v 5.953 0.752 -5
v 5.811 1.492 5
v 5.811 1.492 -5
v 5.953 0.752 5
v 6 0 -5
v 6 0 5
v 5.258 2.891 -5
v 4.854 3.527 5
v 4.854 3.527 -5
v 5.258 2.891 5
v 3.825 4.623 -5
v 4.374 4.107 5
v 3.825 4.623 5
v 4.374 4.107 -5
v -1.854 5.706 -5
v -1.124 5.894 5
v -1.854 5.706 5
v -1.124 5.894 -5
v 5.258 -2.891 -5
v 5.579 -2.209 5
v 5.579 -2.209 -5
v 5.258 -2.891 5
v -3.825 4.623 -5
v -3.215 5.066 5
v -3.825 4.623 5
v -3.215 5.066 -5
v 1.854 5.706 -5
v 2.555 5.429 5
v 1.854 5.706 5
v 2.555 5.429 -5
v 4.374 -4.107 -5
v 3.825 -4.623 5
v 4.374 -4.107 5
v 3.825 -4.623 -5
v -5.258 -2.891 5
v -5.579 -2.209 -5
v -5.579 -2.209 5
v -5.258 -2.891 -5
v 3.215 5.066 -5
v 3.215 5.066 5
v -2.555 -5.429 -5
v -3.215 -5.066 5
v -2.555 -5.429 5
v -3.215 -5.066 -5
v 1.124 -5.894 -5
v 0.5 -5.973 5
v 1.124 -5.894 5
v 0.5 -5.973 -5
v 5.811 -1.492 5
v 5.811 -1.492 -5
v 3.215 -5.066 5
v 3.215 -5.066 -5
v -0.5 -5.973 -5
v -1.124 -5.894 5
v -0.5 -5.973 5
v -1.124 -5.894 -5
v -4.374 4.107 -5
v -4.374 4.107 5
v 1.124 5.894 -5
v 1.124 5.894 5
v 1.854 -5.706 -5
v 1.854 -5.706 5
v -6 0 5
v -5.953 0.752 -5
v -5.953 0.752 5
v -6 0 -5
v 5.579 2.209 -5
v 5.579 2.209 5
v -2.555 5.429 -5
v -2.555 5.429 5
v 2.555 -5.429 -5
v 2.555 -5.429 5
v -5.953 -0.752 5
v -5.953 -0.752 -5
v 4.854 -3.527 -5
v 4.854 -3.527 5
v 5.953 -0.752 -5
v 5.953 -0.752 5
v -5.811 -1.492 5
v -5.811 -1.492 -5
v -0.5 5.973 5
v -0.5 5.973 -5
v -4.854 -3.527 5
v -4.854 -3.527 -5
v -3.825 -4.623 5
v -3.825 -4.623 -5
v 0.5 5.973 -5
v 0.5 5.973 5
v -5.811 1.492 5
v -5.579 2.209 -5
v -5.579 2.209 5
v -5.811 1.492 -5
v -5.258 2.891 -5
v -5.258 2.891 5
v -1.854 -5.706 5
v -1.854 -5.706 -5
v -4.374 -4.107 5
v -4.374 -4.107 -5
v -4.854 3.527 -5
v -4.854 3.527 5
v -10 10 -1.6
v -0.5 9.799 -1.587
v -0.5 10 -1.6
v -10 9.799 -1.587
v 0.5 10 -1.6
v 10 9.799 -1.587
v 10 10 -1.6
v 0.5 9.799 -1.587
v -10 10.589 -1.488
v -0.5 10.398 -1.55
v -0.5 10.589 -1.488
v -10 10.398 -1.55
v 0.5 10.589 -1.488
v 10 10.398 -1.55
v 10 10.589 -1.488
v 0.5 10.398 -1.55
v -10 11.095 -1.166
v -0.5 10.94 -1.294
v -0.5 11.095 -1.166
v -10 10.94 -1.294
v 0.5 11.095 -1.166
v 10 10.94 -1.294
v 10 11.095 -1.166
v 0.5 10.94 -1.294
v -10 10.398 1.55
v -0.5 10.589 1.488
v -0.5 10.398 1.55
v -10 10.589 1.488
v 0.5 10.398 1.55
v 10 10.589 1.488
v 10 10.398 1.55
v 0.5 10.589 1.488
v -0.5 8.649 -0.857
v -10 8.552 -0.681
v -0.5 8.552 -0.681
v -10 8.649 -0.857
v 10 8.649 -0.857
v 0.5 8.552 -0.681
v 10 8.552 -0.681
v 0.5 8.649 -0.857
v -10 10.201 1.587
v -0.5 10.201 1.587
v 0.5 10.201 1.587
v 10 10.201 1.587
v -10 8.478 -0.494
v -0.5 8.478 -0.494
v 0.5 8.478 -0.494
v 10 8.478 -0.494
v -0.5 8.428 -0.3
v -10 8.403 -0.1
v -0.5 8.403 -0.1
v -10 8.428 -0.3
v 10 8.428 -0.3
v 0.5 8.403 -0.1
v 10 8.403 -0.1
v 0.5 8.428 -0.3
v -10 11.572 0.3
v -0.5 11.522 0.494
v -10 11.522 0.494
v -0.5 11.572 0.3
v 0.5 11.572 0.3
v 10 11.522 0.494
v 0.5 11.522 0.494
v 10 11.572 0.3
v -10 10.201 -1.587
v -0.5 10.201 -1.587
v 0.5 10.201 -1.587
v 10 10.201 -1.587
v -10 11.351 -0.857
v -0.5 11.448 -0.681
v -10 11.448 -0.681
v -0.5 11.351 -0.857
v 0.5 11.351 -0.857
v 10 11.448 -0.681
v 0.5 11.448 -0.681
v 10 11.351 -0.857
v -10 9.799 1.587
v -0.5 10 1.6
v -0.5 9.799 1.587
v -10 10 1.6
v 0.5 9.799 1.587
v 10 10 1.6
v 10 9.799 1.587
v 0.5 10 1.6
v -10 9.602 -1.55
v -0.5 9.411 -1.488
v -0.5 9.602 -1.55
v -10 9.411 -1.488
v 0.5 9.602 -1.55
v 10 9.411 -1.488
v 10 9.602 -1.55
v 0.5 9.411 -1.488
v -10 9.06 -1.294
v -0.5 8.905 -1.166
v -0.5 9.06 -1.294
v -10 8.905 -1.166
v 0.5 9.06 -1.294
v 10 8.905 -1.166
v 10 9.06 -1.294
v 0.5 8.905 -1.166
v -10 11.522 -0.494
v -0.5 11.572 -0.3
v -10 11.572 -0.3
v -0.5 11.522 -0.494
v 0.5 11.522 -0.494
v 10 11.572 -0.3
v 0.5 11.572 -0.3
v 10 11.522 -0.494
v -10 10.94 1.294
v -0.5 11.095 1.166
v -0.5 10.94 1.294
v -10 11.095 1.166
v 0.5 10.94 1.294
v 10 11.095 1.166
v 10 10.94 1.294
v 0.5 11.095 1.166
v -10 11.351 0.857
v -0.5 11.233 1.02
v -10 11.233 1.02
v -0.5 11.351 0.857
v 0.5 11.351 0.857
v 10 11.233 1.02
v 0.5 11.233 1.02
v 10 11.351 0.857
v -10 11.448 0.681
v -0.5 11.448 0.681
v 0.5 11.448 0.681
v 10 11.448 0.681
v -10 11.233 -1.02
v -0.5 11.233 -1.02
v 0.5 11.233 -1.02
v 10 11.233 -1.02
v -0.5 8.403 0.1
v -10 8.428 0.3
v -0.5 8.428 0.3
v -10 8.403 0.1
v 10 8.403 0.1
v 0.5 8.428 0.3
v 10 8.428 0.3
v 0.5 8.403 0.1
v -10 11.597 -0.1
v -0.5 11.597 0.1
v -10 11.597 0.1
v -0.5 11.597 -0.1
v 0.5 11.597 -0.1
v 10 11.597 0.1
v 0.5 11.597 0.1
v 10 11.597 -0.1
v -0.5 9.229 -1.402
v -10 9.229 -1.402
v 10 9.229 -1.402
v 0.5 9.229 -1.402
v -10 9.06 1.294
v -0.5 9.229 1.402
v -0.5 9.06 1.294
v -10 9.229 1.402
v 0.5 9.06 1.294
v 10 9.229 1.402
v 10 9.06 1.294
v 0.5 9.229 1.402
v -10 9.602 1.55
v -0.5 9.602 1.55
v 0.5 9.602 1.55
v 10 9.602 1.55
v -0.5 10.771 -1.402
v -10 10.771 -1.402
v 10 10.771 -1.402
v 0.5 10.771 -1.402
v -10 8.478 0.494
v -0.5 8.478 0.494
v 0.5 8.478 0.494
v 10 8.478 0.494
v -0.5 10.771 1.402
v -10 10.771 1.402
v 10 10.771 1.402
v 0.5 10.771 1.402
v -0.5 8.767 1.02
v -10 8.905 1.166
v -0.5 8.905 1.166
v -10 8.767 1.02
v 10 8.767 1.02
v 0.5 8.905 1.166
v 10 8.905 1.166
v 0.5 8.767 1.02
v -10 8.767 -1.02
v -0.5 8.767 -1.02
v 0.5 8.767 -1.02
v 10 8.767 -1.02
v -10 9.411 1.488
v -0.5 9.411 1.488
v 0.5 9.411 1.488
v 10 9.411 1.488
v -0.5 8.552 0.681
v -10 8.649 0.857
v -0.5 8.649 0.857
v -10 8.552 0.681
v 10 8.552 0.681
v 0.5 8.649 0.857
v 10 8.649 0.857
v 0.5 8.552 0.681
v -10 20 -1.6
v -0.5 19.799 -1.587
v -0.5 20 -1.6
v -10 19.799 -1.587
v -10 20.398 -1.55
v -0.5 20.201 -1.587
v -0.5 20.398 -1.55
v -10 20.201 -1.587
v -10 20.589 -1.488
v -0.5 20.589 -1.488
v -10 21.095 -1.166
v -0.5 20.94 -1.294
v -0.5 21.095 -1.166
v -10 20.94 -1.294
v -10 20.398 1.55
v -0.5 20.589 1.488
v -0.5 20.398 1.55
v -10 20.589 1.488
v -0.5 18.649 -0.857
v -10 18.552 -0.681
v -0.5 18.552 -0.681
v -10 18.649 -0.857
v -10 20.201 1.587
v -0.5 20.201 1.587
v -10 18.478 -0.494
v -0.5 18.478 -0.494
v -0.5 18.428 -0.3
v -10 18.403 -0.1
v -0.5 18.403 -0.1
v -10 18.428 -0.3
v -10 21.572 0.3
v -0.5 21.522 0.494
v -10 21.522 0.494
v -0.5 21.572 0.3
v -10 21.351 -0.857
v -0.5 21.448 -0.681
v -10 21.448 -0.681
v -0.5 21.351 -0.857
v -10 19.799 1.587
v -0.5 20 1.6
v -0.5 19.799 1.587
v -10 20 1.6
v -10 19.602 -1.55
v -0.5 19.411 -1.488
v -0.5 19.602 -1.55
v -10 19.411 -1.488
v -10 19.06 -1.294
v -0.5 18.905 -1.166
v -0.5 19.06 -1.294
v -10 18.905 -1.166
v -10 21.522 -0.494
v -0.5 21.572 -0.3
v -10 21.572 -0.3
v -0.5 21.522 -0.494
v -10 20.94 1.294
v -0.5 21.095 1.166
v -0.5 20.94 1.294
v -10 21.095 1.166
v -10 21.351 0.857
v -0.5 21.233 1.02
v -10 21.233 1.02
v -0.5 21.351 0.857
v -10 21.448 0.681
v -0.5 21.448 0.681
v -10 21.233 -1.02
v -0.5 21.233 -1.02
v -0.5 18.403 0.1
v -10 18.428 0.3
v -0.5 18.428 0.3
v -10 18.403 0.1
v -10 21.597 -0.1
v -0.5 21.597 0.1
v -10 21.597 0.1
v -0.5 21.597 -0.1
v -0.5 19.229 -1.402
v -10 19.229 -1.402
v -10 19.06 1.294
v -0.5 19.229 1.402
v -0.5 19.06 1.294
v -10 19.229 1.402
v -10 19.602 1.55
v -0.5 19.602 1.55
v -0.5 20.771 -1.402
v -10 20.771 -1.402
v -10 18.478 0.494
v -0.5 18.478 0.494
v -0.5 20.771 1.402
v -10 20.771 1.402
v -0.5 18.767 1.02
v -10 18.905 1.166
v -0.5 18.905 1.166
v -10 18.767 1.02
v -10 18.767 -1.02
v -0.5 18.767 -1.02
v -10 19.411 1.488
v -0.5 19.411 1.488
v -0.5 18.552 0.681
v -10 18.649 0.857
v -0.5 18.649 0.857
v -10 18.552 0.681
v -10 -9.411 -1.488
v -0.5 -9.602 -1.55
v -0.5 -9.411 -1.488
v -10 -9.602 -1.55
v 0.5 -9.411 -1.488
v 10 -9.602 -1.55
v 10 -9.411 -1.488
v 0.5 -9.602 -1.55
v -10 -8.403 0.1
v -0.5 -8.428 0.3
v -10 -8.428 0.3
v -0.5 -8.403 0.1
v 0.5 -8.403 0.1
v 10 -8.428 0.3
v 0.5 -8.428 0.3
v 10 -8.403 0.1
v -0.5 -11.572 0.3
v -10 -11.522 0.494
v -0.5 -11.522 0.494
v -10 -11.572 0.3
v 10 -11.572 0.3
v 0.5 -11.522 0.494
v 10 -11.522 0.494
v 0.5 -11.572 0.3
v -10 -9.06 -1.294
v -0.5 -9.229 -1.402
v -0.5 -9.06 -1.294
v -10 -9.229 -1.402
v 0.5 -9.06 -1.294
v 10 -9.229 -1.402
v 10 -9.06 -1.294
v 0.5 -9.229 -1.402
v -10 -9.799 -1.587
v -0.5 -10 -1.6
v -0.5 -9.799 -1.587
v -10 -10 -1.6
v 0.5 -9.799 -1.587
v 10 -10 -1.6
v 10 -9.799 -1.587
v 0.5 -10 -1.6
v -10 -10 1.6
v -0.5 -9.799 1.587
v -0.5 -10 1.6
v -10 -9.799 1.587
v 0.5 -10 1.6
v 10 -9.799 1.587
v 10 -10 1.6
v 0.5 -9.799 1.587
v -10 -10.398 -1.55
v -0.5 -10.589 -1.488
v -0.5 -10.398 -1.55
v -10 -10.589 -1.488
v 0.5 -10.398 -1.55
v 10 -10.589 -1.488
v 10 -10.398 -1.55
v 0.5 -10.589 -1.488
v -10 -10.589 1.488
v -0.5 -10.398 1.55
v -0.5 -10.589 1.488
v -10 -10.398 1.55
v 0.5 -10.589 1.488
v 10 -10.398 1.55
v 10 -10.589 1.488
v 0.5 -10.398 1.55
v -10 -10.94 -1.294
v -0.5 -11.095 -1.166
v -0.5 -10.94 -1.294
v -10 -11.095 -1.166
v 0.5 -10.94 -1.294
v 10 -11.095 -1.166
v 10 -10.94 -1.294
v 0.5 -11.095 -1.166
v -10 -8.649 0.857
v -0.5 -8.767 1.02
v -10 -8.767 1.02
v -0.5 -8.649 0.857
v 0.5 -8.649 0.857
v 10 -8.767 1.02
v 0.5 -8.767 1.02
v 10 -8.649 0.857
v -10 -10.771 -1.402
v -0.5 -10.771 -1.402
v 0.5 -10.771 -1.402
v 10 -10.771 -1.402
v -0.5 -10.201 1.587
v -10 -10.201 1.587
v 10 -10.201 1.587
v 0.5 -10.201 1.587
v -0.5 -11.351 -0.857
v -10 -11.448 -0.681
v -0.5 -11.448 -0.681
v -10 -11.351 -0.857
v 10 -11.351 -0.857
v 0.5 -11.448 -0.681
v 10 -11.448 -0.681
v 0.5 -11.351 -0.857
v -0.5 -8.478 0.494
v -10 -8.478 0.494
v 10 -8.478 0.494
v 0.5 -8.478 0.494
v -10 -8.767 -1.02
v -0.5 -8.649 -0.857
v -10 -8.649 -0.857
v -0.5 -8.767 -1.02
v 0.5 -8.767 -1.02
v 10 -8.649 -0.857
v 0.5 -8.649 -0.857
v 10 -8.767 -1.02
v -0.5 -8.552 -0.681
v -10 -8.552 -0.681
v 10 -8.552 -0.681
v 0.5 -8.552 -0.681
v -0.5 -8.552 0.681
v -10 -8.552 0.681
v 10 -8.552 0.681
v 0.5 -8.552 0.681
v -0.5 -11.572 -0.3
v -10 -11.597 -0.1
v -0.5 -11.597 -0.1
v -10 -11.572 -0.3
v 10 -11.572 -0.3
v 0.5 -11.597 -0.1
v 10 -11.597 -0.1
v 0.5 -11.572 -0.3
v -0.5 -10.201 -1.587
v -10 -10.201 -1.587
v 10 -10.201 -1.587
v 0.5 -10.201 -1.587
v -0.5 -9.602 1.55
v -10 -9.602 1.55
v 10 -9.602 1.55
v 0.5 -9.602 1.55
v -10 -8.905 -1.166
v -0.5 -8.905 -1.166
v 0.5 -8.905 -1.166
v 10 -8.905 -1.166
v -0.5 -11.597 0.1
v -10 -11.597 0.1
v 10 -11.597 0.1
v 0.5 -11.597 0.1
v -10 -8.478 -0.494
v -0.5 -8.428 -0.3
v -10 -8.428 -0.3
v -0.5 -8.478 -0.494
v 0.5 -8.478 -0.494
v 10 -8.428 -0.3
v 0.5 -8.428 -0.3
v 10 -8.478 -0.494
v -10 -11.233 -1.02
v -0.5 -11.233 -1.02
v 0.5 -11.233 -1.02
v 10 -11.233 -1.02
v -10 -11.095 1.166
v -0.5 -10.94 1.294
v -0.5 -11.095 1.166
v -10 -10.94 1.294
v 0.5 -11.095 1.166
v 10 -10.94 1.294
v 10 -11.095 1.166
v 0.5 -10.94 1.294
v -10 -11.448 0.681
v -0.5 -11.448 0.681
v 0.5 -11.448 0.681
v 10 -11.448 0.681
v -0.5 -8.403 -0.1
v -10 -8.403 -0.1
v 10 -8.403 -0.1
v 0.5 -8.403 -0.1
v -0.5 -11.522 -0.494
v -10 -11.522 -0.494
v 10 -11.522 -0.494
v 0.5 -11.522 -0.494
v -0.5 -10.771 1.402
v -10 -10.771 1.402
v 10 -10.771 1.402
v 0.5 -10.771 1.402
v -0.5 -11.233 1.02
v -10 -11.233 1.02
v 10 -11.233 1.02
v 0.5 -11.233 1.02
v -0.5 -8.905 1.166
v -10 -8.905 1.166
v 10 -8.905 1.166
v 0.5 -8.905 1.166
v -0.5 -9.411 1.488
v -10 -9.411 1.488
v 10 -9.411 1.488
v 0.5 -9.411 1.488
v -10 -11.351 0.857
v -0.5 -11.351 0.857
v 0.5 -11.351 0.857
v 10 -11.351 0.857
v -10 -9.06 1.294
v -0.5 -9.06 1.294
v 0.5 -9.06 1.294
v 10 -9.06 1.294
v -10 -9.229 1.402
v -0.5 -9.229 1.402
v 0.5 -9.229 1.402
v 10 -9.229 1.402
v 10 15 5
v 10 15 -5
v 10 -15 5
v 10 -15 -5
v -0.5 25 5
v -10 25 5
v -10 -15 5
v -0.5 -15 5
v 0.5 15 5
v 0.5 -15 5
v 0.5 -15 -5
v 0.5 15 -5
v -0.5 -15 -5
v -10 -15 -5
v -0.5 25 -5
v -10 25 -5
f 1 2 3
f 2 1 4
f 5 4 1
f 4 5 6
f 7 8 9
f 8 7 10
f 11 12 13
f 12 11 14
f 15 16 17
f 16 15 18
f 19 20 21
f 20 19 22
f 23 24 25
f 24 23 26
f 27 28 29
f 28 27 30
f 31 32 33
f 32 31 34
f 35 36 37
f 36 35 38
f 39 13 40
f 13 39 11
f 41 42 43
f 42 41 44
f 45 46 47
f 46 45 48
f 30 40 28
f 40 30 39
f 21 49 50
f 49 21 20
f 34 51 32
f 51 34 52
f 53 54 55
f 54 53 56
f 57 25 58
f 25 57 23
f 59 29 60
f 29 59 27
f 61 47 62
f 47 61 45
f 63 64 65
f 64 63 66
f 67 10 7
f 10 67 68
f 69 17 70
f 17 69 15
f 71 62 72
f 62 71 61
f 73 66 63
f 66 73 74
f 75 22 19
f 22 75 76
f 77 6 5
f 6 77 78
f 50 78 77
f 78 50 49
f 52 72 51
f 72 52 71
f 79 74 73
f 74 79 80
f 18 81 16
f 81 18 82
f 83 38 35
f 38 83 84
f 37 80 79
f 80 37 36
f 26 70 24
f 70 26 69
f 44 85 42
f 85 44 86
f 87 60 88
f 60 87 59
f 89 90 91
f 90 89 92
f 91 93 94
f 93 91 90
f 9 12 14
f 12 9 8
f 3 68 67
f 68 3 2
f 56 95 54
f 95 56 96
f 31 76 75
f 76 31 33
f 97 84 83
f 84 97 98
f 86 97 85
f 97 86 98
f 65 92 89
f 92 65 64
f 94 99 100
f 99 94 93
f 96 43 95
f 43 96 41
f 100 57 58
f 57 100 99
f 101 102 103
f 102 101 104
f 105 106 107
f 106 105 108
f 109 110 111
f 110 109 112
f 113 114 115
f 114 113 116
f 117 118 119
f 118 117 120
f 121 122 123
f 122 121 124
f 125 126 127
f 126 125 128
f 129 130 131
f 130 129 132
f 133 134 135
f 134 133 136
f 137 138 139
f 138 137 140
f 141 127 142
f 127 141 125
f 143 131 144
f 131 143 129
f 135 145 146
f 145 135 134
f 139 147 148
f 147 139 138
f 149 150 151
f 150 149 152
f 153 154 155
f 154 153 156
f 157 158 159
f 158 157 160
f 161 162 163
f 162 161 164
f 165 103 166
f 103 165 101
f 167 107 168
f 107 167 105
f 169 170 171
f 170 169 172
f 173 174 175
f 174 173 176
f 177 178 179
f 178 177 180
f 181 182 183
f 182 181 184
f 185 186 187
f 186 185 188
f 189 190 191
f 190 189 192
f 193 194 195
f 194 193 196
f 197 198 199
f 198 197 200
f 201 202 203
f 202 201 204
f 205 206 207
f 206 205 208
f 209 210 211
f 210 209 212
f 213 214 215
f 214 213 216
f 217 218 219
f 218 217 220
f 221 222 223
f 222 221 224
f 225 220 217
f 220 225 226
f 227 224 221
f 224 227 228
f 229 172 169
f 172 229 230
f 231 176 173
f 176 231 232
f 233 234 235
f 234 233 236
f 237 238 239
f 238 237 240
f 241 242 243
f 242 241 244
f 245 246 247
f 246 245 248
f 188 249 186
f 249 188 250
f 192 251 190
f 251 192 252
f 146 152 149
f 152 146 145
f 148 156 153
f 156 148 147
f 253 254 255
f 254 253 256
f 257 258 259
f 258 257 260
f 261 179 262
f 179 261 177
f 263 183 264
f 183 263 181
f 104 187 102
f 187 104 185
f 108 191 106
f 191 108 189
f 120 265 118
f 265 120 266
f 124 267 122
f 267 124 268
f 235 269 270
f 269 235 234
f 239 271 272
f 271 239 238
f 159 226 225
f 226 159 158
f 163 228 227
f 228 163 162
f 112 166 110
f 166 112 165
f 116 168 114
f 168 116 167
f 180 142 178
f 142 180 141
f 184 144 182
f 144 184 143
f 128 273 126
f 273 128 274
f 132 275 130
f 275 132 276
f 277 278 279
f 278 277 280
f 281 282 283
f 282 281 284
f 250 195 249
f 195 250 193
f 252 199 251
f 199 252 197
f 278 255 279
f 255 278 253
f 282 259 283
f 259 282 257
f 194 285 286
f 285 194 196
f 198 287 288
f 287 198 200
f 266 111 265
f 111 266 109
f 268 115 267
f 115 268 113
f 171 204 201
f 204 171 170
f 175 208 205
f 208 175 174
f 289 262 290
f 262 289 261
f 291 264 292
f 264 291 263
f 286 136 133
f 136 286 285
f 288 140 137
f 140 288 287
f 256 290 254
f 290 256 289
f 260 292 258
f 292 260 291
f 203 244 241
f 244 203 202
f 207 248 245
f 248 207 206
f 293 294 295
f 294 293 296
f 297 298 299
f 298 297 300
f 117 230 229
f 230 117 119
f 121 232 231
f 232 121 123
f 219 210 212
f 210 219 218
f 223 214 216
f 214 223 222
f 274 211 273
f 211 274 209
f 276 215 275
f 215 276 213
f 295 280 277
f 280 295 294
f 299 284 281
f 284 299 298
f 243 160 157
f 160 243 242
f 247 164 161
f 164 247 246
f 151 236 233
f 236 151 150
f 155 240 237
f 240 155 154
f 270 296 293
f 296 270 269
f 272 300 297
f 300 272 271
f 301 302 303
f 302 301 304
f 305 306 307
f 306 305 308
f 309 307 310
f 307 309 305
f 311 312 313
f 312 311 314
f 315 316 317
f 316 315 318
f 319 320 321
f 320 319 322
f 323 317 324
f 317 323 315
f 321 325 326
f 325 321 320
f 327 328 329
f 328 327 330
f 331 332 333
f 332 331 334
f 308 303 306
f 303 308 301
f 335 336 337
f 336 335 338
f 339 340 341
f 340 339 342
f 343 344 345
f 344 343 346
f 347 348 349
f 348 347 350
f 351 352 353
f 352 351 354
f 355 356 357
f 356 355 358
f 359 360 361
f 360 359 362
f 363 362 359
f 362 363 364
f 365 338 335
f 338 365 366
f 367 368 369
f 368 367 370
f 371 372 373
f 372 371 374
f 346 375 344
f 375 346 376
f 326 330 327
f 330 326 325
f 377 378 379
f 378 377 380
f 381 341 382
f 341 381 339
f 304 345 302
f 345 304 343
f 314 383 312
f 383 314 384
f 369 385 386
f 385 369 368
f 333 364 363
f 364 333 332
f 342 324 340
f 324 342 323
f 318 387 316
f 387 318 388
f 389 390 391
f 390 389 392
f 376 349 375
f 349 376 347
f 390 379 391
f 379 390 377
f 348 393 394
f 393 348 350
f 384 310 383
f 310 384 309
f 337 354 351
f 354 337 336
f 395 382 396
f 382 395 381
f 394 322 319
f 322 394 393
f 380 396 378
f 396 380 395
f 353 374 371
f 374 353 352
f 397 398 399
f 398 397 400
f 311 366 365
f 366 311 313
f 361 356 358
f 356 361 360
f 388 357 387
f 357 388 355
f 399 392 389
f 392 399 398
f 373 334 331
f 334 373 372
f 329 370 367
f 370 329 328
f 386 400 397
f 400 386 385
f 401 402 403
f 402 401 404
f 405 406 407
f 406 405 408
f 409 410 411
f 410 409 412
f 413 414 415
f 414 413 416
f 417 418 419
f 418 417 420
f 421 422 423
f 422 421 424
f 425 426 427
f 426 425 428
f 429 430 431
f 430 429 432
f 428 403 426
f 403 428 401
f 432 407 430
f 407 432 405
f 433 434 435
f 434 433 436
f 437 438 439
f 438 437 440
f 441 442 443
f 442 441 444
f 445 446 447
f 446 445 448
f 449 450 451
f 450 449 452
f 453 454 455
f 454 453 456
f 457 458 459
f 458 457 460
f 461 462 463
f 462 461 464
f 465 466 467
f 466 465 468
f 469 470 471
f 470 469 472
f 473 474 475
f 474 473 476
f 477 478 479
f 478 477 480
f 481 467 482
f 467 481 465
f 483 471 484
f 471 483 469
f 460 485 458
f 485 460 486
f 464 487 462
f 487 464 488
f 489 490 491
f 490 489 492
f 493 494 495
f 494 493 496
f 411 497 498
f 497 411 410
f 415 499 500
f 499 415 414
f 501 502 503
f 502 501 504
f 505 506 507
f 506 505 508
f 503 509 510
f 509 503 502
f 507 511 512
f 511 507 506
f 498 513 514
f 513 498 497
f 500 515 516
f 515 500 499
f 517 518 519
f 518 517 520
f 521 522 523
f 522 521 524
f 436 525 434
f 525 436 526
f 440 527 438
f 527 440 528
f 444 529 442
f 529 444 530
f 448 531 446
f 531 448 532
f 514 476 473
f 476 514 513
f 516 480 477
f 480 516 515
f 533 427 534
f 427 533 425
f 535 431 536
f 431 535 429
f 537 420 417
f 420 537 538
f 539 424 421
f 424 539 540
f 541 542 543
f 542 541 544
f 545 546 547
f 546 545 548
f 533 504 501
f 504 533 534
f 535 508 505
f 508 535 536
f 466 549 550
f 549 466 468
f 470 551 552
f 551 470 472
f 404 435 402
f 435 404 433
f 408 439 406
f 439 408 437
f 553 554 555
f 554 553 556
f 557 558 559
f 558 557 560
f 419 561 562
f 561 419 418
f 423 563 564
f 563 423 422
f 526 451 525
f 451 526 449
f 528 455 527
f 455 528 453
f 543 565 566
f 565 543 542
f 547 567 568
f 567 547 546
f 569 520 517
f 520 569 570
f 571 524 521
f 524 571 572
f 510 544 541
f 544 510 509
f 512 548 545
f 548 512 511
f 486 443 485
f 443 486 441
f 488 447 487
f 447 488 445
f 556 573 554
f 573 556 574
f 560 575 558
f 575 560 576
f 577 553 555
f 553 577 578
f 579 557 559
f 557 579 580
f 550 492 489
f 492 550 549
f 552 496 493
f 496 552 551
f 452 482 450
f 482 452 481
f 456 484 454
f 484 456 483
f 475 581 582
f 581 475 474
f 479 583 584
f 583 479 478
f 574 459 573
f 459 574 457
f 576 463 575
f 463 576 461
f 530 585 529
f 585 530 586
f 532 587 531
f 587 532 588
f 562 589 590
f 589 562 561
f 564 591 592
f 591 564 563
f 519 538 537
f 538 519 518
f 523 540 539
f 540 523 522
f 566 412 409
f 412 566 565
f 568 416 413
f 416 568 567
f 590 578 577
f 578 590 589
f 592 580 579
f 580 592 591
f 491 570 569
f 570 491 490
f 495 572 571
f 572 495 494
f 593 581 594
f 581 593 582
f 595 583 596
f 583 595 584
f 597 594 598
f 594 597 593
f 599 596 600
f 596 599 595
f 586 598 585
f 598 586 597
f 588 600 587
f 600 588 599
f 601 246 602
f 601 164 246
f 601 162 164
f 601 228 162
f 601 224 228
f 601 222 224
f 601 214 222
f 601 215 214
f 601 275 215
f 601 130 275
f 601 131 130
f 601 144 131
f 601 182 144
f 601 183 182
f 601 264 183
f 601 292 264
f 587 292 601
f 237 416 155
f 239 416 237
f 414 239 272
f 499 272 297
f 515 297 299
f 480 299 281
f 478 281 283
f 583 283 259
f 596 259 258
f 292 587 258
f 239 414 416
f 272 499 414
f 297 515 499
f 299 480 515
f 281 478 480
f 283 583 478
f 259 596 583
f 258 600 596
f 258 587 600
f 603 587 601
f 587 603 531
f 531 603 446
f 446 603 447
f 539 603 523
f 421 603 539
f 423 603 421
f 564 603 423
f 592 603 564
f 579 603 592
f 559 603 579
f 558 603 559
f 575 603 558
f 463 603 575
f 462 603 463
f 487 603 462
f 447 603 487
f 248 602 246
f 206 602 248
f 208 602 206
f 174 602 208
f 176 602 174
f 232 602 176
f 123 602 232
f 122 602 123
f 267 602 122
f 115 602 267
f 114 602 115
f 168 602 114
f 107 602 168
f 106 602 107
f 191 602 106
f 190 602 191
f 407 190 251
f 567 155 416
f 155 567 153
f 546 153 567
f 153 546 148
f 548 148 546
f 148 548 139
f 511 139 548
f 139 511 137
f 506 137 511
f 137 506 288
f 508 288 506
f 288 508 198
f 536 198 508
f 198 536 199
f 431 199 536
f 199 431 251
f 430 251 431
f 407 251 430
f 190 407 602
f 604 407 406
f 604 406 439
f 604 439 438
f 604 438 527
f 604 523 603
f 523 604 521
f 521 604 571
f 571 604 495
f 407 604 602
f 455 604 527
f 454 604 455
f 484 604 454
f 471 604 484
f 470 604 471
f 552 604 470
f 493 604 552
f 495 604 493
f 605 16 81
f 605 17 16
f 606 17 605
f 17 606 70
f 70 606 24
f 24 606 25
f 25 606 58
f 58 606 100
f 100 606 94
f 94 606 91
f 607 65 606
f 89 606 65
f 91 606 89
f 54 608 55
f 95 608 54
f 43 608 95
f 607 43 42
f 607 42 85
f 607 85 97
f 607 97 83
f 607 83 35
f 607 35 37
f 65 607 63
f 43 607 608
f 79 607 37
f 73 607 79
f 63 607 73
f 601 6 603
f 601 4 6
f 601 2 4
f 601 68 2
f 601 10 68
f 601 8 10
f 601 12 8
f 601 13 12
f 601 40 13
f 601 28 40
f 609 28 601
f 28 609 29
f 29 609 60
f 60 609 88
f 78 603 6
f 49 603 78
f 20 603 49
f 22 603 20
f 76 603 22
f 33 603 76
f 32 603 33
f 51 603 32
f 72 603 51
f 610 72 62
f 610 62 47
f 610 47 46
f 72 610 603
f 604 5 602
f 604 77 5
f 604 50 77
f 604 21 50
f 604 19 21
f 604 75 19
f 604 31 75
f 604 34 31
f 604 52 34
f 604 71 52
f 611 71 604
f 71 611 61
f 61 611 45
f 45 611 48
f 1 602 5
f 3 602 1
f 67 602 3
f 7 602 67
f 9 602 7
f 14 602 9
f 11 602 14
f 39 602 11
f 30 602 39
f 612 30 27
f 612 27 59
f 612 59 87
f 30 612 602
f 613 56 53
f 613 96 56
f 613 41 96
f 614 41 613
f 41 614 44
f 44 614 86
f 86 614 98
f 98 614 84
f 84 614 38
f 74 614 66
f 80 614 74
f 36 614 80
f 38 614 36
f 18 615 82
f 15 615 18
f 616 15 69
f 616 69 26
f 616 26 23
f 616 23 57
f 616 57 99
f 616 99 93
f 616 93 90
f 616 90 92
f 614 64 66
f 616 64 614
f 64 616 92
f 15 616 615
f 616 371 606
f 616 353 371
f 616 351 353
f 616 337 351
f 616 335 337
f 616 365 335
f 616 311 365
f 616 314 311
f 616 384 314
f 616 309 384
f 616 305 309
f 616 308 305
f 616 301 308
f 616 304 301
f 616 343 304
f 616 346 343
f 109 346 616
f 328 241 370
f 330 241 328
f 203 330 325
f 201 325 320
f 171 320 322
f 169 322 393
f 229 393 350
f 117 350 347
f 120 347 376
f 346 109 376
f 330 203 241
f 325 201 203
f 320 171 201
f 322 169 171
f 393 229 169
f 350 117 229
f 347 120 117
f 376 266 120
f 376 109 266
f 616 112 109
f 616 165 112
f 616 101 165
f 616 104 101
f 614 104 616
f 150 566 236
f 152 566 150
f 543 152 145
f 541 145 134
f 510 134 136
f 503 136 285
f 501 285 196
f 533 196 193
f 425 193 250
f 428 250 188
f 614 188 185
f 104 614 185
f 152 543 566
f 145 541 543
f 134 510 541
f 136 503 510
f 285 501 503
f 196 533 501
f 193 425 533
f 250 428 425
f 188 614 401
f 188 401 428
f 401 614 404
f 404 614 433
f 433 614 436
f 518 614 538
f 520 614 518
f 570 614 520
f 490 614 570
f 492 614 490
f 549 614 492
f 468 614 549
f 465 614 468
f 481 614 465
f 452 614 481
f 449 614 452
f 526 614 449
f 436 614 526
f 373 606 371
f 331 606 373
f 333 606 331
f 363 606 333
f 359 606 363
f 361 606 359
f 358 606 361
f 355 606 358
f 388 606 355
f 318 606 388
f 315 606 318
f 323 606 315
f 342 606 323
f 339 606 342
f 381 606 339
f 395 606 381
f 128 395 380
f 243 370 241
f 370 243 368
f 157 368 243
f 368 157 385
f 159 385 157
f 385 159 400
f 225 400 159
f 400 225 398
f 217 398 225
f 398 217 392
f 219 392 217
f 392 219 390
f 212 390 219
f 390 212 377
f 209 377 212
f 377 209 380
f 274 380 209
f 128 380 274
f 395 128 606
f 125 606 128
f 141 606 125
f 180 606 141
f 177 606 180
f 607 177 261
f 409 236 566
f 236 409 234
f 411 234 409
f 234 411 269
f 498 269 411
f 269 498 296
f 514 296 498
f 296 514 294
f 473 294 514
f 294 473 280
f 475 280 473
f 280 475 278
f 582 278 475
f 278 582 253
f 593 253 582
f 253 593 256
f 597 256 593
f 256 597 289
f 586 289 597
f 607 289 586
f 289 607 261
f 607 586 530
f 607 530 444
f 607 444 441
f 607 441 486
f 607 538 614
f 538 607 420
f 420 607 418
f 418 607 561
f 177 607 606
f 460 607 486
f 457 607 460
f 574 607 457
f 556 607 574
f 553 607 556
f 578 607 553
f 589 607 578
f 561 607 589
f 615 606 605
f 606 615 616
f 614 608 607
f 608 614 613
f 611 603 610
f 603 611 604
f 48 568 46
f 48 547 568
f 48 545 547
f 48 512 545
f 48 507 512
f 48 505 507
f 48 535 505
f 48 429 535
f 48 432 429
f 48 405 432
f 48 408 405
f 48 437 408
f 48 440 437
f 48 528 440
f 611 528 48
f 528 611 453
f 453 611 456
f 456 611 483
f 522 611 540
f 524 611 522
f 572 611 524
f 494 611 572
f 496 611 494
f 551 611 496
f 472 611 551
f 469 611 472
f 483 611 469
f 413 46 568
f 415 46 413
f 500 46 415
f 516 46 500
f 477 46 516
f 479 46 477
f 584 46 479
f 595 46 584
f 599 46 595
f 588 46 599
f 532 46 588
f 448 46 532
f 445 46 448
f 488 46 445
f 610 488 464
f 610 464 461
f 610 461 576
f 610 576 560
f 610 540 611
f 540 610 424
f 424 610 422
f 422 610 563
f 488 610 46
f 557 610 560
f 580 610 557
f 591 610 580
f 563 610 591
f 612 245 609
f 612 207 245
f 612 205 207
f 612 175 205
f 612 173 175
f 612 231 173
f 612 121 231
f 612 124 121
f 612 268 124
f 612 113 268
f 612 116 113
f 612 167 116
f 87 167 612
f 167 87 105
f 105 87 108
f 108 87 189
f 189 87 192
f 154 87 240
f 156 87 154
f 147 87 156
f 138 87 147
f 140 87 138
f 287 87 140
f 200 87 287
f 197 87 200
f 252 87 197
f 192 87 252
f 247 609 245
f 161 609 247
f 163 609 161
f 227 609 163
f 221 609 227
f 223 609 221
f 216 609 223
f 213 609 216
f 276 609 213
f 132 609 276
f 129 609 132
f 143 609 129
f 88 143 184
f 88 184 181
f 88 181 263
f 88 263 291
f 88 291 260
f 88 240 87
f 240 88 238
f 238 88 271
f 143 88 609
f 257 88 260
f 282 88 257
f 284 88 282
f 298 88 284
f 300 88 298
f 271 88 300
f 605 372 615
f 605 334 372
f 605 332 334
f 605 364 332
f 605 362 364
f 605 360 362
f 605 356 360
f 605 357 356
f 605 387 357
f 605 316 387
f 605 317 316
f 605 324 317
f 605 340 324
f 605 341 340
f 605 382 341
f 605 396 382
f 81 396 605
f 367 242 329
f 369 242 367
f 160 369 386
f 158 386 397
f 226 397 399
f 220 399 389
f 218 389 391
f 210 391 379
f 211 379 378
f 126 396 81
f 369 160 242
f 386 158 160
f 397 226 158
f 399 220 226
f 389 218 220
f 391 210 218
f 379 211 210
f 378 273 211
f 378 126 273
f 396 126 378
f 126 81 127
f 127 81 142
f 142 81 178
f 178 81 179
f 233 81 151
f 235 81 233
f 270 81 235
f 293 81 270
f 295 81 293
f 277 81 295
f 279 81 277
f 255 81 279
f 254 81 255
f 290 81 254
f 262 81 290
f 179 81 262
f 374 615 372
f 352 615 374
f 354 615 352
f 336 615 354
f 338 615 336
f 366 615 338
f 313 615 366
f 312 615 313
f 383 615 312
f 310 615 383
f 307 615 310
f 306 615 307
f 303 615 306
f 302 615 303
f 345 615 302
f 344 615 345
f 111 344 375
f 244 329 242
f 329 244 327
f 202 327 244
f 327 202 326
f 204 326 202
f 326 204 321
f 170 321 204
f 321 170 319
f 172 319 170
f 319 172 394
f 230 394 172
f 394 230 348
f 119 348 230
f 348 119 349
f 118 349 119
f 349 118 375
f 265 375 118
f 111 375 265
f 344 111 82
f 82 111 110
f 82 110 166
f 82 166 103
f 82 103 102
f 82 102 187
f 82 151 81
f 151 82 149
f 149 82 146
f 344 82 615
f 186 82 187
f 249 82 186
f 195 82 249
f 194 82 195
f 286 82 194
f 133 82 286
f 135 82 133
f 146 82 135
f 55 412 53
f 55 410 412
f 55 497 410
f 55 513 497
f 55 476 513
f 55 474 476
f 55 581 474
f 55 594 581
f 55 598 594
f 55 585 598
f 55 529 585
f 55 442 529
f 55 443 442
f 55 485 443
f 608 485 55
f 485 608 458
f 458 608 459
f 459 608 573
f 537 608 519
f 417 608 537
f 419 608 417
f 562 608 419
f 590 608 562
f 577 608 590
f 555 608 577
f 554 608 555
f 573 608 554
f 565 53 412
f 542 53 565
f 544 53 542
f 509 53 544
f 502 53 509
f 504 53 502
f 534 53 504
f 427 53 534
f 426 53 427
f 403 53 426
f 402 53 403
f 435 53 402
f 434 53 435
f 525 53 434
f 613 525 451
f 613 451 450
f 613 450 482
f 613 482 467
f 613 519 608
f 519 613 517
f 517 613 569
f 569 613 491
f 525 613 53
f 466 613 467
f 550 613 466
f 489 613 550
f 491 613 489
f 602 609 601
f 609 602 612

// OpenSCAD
// file: configuration.scad
motor_end_height=50;
idler_end_height=28;
carriage_height=24;
platform_thickness=8;
bed_thickness=12;
pcb_thickness=2;
rod_length=290;
smooth_rod_length=1000;
smooth_rod_diameter=12;
smooth_rod_distance=80;
sandwich_smooth_rod_mounting_screw_distance=12;
tower_radius = 200;
platform_hinge_offset=33;
carriage_hinge_offset=22;
plywood_thickness=9;
// main file
include <configuration.scad>
$fn=50;

module metallparts(smoothrod_dia) {
	cylinder(r=smoothrod_dia/2,h=100,center=true);
	translate([0,10,0])rotate([0,90,0])cylinder(r=1.6,h=50,center=true);
	translate([0,20,0])rotate([0,90,0])cylinder(r=1.6,h=50,center=true);
	translate([0,-10,0])rotate([0,90,0])cylinder(r=1.6,h=50,center=true);
}

module rod_helper(smoothrod_dia) {
	difference() {
		translate([0,5,0])cube([20,40,10],center=true);
		cube([1,60,15], center=true);
	   translate([5,22.5,0])cube([11,15,15],center=true);
		metallparts(smoothrod_dia);
	}
}

%metallparts(smooth_rod_diameter);
rod_helper(smooth_rod_diameter);
